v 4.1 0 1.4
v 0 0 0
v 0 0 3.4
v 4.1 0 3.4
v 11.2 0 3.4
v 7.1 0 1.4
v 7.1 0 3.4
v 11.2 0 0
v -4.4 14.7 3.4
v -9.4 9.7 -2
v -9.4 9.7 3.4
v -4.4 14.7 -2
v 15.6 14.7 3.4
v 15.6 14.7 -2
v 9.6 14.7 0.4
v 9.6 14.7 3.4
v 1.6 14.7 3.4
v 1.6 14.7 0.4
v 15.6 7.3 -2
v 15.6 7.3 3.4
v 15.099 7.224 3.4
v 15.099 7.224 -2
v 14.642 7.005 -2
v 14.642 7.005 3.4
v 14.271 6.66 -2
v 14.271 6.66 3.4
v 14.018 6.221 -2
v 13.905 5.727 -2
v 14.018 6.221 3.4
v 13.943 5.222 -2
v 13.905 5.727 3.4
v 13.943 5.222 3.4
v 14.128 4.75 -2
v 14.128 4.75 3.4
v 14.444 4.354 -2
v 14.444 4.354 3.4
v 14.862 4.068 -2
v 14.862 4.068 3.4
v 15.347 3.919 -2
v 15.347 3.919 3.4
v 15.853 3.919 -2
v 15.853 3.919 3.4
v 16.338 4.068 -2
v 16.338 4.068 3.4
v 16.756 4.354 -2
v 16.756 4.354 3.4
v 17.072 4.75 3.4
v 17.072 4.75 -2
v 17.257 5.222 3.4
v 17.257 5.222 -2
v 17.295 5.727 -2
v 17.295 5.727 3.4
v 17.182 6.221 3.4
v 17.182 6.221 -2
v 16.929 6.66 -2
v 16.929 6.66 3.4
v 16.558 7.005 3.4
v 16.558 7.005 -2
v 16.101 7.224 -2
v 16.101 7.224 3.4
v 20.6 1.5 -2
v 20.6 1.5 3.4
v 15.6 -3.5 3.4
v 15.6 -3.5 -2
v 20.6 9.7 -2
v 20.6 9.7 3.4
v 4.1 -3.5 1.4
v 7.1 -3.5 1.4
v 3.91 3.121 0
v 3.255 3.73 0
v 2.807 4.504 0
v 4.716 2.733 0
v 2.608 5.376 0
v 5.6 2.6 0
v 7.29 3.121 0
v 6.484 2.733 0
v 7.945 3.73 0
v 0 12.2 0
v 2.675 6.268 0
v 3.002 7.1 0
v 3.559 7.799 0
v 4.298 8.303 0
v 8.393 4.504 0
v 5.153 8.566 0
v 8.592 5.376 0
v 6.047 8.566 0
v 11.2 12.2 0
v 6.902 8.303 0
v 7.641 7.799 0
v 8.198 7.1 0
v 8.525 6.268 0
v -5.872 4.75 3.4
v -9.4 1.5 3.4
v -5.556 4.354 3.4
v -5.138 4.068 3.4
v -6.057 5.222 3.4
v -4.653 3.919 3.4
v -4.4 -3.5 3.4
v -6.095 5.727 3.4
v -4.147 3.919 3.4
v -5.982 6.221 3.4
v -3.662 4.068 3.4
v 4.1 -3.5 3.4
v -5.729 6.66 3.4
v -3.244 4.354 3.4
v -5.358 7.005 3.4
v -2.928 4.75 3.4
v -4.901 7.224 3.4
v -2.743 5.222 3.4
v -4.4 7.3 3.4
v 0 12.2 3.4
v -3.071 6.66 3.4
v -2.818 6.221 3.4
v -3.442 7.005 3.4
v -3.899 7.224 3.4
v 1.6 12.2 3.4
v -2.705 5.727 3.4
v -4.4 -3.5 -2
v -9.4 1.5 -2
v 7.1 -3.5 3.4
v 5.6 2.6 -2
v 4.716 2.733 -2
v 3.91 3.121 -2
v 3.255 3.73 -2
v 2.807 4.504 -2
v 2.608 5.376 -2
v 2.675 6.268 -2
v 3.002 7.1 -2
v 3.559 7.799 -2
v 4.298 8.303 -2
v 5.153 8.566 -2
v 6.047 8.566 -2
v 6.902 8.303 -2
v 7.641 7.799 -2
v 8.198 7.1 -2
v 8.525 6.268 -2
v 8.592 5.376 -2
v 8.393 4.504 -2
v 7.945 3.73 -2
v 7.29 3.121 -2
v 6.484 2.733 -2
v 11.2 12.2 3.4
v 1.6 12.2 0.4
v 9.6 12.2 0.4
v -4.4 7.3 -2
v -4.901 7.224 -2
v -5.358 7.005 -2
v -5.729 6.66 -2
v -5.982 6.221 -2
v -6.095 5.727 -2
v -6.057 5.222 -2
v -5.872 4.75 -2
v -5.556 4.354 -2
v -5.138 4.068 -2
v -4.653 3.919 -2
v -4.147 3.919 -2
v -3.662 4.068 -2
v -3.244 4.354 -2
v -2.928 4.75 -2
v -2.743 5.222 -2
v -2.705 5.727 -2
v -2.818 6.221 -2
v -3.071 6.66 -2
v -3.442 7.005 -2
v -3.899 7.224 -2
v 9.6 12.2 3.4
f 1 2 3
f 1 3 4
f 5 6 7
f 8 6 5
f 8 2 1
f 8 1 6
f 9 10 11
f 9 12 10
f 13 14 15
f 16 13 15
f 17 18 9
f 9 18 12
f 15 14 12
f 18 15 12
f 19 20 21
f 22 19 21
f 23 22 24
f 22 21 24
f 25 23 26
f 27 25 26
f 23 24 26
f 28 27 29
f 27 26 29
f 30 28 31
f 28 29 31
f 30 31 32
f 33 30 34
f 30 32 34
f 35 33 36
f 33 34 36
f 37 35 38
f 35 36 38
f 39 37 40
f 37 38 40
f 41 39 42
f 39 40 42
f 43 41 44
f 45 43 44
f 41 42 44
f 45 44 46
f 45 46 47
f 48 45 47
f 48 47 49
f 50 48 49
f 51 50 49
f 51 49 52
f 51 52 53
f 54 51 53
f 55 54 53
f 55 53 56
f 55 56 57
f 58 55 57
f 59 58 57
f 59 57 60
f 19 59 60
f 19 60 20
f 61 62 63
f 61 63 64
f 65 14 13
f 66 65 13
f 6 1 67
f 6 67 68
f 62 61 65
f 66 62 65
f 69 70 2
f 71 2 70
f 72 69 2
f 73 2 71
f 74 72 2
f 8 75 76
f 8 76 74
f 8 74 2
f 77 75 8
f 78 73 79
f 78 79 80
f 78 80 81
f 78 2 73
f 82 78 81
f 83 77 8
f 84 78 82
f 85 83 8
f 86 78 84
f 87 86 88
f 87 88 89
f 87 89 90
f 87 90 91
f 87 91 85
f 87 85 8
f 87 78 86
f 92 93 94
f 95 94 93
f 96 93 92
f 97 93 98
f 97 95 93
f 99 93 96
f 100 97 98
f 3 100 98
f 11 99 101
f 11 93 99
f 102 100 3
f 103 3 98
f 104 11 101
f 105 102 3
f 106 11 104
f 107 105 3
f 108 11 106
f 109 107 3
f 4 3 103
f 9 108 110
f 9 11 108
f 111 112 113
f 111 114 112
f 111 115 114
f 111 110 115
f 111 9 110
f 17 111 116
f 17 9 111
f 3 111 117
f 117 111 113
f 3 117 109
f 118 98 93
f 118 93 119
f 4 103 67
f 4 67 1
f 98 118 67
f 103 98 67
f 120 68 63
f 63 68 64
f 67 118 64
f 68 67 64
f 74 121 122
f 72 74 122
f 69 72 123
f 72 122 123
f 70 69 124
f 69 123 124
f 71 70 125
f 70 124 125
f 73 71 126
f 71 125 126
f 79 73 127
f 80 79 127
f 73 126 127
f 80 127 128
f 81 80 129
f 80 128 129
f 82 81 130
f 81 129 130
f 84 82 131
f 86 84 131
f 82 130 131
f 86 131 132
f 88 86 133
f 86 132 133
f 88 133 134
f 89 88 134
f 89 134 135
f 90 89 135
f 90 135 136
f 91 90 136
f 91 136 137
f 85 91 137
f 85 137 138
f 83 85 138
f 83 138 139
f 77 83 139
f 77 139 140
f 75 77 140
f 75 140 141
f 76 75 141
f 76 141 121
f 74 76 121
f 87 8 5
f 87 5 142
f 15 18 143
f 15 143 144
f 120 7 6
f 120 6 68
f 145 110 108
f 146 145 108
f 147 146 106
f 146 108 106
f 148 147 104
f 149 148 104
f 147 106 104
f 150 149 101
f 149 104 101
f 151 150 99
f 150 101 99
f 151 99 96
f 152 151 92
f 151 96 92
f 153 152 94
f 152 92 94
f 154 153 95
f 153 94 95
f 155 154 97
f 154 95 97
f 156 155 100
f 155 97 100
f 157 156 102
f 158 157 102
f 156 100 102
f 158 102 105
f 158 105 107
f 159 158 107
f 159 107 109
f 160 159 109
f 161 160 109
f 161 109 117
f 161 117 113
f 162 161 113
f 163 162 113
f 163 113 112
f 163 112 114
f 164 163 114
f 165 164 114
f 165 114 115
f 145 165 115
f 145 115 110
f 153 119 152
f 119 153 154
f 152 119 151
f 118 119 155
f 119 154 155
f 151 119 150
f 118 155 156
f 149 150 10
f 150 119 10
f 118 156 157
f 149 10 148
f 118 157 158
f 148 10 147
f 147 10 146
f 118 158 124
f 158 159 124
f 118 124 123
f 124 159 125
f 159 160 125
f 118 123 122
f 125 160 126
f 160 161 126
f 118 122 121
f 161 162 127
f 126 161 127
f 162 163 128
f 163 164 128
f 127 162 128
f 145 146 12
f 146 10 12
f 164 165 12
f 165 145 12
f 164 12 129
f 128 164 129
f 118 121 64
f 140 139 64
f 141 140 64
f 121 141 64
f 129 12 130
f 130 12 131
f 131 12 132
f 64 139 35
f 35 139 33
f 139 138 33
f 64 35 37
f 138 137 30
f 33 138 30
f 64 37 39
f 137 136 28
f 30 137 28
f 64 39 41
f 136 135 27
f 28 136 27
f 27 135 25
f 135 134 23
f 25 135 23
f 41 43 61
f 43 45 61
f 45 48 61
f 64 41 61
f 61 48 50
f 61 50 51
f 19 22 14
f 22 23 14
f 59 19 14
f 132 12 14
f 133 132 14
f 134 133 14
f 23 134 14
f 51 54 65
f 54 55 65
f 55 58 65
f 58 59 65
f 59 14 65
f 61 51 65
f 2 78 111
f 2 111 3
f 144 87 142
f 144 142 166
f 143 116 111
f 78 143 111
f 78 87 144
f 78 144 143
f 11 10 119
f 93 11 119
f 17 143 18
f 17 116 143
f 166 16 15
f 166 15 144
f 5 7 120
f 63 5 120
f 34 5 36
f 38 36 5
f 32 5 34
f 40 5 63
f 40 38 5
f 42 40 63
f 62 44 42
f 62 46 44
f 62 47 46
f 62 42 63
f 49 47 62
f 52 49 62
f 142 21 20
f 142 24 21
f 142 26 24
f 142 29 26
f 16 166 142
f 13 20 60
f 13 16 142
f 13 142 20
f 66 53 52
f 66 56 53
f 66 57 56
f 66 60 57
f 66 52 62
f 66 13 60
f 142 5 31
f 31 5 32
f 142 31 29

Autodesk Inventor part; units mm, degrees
ref_plane "YZ Plane" through (0, 0, 0) normal (1, 0, 0) x (0, 1, 0)
ref_plane "XZ Plane" through (0, 0, 0) normal (0, 1, 0) x (-1, 0, 0)
ref_plane "XY Plane" through (0, 0, 0) normal (0, 0, 1) x (1, 0, 0)
sketch "スケッチ1" plane through (0, 0, 0) normal (0, 0, 1) x (1, 0, 0)
  line L0 (0, 0) -> (11.2, 0)
  line L1 (11.2, 0) -> (11.2, 12.2)
  line L2 (11.2, 12.2) -> (0, 12.2)
  line L3 (0, 12.2) -> (0, 0)
  line L4 (-9.4, -3.5) -> (20.6, -3.5)
  line L5 (20.6, -3.5) -> (20.6, 14.7)
  line L6 (20.6, 14.7) -> (-9.4, 14.7)
  line L7 (-9.4, 14.7) -> (-9.4, -3.5)
  dimension "d0" = 11.2
  dimension "d1" = 12.2
  dimension "d2" = 2.5
  dimension "d3" = 3.5
  dimension "d4" = 9.4
  dimension "d5" = 9.4
extrude "押し出し1" add sketch "スケッチ1" along normal blind 3.4
extrude "押し出し2" add sketch "スケッチ1" against normal blind 2 contours L3 L2 L1 L0 | L7 L6 L5 L4
sketch "スケッチ2" plane through (0, 0, 3.4) normal (0, 0, 1) x (1, 0, 0)
  line L0 (11.2, 0) -> (0, 0) projected
  line L1 (0, 12.2) -> (11.2, 12.2) projected
  point P0 (5.6, 5.6)
  dimension "d41" = 6.6
hole "穴1" at (5.6, 5.6, 3.4) direction (0, 0, -1) diameter 6 end through all
sketch "スケッチ3" plane through (0, 0, 3.4) normal (0, 0, 1) x (1, 0, 0)
  line L0 (0, 12.2) -> (11.2, 12.2) projected
  line L1 (-9.4, 14.7) -> (20.6, 14.7) projected
  line L2 (9.6, 12.2) -> (1.6, 12.2)
  line L3 (1.6, 12.2) -> (1.6, 14.7)
  line L4 (1.6, 14.7) -> (9.6, 14.7)
  line L5 (9.6, 14.7) -> (9.6, 12.2)
  line L6 (-9.4, 14.7) -> (-9.4, -3.5) projected
  line L7 (20.6, -3.5) -> (20.6, 14.7) projected
  point P0 (0, 0)
  point P1 (9.6, 14.7)
  dimension "d17" = 8
  dimension "d18" = 11
  dimension "d33" = 30
extrude "押し出し3" cut sketch "スケッチ3" against normal blind 3
sketch "スケッチ4" plane through (0, 0, -2) normal (0, 0, -1) x (-1, 0, 0)
  circle A0 centre (-5.6, 5.6) radius 3 projected
  line L0 (-20.6, -3.5) -> (9.4, -3.5) projected
  line L1 (9.4, 14.7) -> (-20.6, 14.7) projected
  point P0 (0, 0)
  point P1 (-15.6, 5.6)
  point P2 (4.4, 5.6)
  dimension "d21" = 20
  dimension "d22" = 10
  dimension "d23" = 10
  dimension "d24" = 9.1
  dimension "d25" = 18.2
hole "穴2" at (15.6, 5.6, -2) at (-4.4, 5.6, -2) direction (0, 0, 1) diameter 3.4 end through all
sketch "スケッチ5" plane through (0, 0, 3.4) normal (0, 0, 1) x (1, 0, 0)
  line L0 (20.6, -3.5) -> (-9.4, -3.5) projected
  line L1 (11.2, 0) -> (0, 0) projected
  line L2 (7.1, -3.5) -> (4.1, -3.5)
  line L3 (4.1, -3.5) -> (4.1, 0)
  line L4 (4.1, 0) -> (7.1, 0)
  line L5 (7.1, 0) -> (7.1, -3.5)
  line L6 (-9.4, 14.7) -> (-9.4, -3.5) projected
  point P0 (7.1, 0)
  dimension "d34" = 3
  dimension "d35" = 13.5
extrude "押し出し4" cut sketch "スケッチ5" against normal blind 2
chamfer "面取り1" distance 5 angle 45 4 edges at (20.6, -3.5, 0.7) (20.6, 14.7, 0.7) (-9.4, -3.5, 0.7) (-9.4, 14.7, 0.7)
equation "\"d24\" = 0.5 * d25"
properties part number "_3D プリント"
